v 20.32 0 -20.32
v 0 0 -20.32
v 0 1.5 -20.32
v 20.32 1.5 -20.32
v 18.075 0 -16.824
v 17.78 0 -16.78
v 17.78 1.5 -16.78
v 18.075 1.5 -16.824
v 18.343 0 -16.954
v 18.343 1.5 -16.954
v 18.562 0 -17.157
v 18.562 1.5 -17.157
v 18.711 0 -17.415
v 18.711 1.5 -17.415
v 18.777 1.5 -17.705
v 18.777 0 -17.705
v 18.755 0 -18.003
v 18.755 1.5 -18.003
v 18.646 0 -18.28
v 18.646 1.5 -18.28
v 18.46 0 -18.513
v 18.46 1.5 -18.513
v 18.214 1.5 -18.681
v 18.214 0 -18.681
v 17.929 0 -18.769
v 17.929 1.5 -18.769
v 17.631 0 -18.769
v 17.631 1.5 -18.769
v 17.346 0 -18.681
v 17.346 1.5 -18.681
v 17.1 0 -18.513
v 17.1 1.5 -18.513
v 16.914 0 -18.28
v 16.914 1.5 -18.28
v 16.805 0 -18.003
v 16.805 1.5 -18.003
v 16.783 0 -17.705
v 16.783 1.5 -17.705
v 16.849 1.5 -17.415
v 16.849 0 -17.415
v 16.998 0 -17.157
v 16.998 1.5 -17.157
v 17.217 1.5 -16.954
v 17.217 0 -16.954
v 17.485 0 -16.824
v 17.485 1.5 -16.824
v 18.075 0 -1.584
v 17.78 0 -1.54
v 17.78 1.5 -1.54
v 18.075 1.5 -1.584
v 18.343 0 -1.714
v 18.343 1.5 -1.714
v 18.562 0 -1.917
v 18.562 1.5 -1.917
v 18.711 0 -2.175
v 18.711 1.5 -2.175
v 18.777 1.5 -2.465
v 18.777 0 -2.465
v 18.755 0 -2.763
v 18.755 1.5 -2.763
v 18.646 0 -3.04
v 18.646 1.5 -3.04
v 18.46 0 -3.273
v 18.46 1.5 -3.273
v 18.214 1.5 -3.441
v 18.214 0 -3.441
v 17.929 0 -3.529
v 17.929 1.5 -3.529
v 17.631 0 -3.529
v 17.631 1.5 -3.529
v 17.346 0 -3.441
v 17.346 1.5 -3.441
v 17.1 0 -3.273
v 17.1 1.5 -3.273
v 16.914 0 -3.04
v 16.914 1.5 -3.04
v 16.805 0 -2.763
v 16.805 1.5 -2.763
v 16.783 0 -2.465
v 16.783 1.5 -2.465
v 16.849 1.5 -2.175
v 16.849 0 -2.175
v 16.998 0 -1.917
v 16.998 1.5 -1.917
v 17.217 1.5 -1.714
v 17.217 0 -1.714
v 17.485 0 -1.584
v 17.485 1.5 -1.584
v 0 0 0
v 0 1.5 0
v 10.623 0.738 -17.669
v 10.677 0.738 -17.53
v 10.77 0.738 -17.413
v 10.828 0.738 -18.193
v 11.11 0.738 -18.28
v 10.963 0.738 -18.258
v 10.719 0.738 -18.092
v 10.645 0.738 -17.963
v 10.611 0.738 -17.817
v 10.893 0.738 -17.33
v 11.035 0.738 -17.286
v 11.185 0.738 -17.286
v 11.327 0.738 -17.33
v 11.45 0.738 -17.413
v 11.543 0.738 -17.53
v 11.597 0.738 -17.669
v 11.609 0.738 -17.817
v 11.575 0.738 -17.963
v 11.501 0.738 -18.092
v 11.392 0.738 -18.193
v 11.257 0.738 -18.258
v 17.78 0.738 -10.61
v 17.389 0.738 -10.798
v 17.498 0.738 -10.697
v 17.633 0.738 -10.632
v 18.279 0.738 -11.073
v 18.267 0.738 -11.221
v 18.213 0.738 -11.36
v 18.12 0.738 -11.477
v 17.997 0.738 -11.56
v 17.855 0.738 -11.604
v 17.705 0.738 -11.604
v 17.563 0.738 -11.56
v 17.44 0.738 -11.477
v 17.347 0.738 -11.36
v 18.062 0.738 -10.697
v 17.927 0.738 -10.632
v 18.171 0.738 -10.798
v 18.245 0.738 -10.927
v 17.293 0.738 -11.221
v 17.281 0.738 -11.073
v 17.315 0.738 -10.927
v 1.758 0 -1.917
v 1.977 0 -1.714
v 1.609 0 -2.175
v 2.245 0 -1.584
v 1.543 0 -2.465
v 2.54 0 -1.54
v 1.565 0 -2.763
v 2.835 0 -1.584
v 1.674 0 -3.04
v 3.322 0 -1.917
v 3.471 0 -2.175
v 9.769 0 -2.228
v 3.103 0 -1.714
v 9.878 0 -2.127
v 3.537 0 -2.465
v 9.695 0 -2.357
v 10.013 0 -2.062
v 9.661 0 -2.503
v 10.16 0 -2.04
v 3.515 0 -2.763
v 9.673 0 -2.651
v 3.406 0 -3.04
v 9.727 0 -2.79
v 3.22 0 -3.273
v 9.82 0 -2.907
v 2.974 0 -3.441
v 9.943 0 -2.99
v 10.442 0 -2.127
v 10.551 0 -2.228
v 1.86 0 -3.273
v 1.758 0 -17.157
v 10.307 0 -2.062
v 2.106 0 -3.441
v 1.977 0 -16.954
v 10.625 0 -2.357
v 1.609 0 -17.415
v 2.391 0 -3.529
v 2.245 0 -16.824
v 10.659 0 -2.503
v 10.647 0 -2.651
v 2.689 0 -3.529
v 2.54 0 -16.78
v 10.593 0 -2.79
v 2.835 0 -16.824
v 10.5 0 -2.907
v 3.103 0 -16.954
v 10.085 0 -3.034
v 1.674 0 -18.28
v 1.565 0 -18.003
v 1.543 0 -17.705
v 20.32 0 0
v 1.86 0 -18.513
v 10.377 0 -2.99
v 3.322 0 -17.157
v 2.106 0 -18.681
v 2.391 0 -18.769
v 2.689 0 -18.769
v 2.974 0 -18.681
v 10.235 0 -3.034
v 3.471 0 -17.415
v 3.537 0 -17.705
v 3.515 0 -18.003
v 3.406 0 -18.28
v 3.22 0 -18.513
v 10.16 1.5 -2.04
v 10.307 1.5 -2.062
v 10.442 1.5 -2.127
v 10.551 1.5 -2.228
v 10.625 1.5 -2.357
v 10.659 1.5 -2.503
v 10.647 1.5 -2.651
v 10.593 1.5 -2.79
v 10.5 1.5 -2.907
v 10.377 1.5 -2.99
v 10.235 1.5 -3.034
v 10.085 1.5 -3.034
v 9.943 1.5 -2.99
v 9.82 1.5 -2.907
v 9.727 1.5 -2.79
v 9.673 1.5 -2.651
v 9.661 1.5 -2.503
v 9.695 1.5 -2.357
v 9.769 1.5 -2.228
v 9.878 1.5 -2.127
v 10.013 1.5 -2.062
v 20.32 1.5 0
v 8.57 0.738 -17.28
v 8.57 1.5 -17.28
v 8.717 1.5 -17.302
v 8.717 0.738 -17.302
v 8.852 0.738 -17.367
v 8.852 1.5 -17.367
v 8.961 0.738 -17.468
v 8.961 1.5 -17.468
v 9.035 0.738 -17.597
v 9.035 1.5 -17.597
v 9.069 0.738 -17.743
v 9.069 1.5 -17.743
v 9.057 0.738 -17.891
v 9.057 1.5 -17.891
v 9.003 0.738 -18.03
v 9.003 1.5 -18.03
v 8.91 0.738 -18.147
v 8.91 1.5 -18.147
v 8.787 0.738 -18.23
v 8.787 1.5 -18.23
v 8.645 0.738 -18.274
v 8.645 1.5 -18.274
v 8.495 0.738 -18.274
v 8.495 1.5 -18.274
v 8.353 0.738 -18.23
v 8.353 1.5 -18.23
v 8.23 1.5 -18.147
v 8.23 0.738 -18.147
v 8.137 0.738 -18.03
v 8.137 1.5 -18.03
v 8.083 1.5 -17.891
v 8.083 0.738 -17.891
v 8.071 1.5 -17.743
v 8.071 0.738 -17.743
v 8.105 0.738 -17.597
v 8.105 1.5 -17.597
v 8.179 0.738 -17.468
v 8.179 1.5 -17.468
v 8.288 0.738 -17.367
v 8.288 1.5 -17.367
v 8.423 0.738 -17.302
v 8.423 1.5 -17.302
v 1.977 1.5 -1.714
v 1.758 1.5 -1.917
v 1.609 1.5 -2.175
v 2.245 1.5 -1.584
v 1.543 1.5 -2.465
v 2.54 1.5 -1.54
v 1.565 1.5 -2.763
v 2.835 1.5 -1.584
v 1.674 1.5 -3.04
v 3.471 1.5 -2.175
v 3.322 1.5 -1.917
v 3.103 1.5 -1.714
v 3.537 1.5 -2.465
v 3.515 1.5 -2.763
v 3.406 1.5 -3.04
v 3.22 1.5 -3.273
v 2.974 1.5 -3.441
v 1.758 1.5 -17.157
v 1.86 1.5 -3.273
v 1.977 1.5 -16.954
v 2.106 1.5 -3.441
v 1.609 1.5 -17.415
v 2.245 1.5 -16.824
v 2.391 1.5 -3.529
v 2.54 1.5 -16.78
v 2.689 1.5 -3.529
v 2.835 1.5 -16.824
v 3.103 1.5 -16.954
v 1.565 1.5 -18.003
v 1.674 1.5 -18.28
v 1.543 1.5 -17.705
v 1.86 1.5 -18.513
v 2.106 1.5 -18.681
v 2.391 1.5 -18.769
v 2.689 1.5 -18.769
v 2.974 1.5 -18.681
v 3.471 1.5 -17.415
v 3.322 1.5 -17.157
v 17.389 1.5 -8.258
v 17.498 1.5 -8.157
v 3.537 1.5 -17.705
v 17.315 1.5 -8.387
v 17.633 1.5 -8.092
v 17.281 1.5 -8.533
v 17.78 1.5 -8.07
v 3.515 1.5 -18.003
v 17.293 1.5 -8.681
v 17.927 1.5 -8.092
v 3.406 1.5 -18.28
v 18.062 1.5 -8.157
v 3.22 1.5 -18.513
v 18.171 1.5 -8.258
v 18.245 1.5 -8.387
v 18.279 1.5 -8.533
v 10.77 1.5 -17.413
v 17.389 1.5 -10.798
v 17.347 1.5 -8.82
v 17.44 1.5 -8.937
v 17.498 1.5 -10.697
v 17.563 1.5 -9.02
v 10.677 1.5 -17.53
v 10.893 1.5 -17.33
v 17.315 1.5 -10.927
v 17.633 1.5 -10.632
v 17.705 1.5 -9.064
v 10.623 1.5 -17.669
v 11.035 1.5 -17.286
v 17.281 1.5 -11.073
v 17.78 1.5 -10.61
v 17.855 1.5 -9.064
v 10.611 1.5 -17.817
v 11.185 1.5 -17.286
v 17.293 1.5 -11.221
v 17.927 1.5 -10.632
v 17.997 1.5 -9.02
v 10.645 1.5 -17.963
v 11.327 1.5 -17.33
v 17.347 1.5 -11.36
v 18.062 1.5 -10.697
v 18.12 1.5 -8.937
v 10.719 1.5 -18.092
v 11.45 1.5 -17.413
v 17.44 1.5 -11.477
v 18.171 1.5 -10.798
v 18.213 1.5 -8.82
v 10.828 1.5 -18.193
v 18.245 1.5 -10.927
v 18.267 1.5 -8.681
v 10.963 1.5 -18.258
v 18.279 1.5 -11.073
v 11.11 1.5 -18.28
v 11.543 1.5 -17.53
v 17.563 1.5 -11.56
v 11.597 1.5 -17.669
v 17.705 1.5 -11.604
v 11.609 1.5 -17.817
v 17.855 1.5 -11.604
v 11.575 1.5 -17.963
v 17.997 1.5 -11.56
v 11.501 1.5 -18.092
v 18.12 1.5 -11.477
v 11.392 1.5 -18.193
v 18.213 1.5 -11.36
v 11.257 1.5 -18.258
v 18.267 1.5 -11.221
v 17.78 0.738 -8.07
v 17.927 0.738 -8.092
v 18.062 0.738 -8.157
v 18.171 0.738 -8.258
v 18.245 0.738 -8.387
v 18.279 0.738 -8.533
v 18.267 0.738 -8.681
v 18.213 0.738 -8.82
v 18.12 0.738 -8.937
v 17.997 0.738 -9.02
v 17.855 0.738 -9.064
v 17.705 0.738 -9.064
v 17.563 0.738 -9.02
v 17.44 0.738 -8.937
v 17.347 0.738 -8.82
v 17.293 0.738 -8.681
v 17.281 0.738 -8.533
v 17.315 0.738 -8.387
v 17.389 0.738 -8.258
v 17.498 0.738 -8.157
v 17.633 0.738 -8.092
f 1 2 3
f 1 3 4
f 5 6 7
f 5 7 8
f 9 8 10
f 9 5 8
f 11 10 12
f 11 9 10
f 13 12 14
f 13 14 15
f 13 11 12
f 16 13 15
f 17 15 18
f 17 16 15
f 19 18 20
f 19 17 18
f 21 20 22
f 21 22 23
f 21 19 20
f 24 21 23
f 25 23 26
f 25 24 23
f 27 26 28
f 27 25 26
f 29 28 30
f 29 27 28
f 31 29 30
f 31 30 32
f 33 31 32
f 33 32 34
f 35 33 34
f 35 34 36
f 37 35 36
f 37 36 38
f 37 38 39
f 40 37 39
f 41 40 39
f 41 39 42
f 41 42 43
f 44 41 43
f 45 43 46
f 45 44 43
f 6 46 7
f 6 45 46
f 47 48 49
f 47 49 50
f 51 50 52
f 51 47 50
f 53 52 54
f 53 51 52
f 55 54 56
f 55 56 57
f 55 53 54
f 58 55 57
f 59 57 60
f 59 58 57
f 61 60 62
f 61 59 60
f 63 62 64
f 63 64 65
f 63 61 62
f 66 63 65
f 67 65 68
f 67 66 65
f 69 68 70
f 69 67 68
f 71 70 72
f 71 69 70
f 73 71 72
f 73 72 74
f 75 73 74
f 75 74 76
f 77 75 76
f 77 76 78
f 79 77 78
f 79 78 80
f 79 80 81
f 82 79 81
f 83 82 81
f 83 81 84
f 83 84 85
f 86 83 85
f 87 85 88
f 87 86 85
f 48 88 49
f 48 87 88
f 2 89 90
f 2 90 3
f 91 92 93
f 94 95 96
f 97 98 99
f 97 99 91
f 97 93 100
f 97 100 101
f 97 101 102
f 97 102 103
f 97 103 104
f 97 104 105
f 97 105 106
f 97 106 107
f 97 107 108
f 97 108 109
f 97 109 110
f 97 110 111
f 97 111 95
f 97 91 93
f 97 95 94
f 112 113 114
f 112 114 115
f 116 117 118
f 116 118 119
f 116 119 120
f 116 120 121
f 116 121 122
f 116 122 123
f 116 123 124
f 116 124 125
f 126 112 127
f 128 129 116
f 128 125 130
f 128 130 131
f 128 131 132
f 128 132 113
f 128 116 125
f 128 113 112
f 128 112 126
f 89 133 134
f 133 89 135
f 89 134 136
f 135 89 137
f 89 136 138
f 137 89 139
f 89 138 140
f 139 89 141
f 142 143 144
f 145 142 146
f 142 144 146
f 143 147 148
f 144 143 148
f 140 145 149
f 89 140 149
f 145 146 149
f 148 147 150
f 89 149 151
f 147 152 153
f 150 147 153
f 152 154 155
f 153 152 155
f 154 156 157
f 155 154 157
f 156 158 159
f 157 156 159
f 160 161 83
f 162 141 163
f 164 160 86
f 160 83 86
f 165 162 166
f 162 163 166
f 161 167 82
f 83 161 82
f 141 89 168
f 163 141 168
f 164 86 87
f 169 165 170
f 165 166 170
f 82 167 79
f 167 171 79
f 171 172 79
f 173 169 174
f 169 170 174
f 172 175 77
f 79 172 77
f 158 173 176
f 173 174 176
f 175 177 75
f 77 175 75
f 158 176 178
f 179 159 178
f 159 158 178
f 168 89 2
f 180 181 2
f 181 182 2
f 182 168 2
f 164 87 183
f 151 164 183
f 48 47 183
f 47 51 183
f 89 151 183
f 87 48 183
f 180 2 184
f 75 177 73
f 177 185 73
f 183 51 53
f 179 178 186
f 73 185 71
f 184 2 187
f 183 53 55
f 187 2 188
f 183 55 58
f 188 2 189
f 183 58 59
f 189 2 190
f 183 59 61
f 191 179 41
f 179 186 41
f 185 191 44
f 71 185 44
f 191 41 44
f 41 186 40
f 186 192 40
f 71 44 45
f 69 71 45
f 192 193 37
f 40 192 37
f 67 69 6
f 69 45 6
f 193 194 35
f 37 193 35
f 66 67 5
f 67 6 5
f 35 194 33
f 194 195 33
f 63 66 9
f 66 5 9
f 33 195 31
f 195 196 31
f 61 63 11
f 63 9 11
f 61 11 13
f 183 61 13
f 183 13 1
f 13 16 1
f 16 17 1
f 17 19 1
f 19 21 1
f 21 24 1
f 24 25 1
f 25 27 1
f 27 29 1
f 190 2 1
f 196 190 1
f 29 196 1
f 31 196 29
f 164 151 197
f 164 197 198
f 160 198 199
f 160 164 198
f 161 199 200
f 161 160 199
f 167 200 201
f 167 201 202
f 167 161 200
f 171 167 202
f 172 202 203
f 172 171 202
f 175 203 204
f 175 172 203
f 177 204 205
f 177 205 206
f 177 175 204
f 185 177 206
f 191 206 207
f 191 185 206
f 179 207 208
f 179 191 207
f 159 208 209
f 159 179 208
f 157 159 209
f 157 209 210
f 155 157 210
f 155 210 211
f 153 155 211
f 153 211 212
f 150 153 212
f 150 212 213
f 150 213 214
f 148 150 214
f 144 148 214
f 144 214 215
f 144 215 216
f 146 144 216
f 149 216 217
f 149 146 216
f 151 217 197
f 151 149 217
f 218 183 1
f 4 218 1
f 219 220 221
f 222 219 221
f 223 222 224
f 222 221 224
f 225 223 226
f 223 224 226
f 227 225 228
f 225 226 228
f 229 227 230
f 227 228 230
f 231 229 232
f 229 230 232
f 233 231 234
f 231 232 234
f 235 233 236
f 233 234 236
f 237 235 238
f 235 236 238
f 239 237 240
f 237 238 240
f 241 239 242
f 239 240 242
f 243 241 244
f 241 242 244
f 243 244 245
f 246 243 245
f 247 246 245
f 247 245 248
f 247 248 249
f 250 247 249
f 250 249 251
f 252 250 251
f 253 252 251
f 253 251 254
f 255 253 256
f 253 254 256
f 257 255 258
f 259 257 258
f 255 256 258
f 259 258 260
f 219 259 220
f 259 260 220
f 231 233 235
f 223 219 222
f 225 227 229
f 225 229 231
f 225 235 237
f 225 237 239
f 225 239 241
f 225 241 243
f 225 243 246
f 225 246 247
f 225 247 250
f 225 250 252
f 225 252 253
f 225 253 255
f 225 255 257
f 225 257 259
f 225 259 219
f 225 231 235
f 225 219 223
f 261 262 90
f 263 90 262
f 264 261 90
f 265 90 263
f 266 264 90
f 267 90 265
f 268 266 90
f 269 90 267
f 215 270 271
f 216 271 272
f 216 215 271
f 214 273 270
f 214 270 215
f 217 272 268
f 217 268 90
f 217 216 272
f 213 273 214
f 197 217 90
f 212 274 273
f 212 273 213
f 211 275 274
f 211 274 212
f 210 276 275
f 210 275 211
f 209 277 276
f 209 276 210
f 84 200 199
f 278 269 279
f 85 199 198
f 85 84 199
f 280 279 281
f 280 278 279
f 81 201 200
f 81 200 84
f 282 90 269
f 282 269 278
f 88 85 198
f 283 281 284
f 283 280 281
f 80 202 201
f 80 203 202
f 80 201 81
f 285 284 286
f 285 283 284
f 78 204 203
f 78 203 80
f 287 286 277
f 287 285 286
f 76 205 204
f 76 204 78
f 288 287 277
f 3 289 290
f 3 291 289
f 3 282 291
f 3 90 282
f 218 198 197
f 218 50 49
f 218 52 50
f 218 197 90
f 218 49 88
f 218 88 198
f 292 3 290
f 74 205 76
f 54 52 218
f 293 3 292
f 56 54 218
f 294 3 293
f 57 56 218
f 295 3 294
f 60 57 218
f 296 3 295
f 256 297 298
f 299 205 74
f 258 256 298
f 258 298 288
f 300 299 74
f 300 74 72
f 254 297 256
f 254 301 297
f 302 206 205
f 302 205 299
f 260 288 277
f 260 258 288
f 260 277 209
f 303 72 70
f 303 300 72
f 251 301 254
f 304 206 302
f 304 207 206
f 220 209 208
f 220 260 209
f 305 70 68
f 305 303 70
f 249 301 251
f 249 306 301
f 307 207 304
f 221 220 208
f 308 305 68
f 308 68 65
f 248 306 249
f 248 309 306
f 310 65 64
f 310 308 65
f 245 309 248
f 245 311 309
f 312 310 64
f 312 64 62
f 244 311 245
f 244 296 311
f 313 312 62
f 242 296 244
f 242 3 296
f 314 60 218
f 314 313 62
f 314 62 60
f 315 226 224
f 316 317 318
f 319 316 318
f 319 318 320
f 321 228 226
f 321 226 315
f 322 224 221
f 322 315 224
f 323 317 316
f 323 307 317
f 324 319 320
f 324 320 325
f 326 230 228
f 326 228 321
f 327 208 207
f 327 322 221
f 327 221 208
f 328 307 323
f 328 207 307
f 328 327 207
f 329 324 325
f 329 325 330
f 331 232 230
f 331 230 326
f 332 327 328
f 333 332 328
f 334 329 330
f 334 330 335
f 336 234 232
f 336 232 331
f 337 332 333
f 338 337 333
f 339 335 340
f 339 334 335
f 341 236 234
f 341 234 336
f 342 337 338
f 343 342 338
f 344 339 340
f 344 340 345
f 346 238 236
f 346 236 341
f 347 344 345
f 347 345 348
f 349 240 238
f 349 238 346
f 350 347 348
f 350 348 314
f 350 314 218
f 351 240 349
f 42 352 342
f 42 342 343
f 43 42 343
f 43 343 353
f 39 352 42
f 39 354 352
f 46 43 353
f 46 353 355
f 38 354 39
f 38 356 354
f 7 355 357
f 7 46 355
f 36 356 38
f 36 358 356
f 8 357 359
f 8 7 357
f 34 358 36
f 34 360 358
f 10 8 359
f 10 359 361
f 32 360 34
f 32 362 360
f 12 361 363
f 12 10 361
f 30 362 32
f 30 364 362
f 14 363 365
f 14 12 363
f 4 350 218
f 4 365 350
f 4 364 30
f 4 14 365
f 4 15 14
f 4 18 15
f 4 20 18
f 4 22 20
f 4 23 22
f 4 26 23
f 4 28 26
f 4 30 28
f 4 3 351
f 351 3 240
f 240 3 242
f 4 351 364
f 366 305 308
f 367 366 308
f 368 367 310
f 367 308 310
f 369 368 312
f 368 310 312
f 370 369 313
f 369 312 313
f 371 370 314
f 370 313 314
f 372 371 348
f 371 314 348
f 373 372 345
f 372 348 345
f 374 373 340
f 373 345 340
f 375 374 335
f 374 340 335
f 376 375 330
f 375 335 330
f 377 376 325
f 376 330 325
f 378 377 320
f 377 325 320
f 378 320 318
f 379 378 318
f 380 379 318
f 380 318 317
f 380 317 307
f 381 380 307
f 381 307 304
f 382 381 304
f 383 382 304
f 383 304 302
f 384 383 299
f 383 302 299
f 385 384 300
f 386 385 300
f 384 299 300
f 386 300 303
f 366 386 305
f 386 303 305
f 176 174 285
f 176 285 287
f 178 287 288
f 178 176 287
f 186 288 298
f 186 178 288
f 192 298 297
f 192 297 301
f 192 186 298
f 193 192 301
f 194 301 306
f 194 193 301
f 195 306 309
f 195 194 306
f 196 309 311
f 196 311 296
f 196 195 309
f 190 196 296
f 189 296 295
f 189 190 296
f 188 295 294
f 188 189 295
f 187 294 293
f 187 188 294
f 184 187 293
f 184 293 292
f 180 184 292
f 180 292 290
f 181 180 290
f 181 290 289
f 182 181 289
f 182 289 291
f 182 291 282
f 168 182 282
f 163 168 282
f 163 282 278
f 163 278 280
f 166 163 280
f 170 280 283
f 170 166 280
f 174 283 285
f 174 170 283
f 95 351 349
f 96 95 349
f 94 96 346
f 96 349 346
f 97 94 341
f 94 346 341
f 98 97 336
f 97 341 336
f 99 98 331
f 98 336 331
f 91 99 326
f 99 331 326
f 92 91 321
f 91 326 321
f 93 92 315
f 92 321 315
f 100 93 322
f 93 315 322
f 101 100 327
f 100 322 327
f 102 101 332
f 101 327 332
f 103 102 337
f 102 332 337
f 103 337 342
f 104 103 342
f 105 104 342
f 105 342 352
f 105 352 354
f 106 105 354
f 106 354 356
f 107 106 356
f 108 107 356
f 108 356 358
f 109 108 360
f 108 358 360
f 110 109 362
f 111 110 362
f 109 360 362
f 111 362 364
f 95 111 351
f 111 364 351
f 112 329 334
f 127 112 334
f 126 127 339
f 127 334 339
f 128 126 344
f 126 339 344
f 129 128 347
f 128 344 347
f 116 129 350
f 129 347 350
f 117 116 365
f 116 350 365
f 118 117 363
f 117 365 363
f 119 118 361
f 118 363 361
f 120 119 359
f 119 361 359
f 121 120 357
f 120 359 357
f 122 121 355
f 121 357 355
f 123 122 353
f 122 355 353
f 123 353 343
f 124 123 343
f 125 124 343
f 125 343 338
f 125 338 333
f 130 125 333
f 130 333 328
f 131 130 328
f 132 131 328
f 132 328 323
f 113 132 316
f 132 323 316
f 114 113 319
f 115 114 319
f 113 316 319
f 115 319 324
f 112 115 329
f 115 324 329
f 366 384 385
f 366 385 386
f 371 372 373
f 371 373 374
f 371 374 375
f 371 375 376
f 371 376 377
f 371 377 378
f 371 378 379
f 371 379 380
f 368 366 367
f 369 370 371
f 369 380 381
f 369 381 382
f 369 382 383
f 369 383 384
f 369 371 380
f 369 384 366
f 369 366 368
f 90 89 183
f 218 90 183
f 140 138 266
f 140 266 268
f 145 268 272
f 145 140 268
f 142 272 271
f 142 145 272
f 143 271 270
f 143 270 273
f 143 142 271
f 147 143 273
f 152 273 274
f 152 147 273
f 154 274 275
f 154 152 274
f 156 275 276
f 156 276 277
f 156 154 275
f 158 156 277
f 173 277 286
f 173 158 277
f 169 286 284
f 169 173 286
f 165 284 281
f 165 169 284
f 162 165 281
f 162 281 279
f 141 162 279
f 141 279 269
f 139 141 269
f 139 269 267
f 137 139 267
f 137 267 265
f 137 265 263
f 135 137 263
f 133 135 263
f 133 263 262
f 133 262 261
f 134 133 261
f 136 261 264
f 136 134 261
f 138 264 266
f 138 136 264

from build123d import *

# Parameters (mm, degrees)
SKETCH1_W           = 20.32
SKETCH1_H           = 20.32
SKETCH1_R           = 1
SKETCH1_R_2         = 0.5
BOSS_EXTRUDE1_DEPTH = 1.5
CUT_EXTRUDE1_START  = 1.5
SKETCH1_3_R         = 0.5
CUT_EXTRUDE1_DEPTH  = 0.762


with BuildPart() as part:
    # Sketch1 → Boss-Extrude1 (new body)
    with BuildSketch(Plane(origin=(0, 0, 0), x_dir=(1, 0, 0), z_dir=(0, 1, 0))):
        with Locations((10.16, 10.16)):
            Rectangle(SKETCH1_W, SKETCH1_H)
        with Locations(Location((2.54, 2.54, 0), (0, 0, 270))):  # turned: the seam where the file's is
            Circle(SKETCH1_R, mode=Mode.SUBTRACT)
        with Locations(Location((17.78, 2.54, 0), (0, 0, 270))):  # turned: the seam where the file's is
            Circle(SKETCH1_R, mode=Mode.SUBTRACT)
        with Locations(Location((17.78, 17.78, 0), (0, 0, 270))):  # turned: the seam where the file's is
            Circle(SKETCH1_R, mode=Mode.SUBTRACT)
        with Locations(Location((2.54, 17.78, 0), (0, 0, 270))):  # turned: the seam where the file's is
            Circle(SKETCH1_R, mode=Mode.SUBTRACT)
        with Locations(Location((10.16, 2.54, 0), (0, 0, 270))):  # turned: the seam where the file's is
            Circle(SKETCH1_R_2, mode=Mode.SUBTRACT)
    extrude(amount=BOSS_EXTRUDE1_DEPTH)

    # Sketch1_3 → Cut-Extrude1 (cut)
    with BuildSketch(Plane(origin=(0, 0, 0), x_dir=(1, 0, 0), z_dir=(0, 1, 0)).offset(CUT_EXTRUDE1_START)):
        with Locations(Location((17.78, 11.11, 0), (0, 0, 270))):  # turned: the seam where the file's is
            Circle(SKETCH1_3_R)
        with Locations(Location((17.78, 8.57, 0), (0, 0, 270))):  # turned: the seam where the file's is
            Circle(SKETCH1_3_R)
        with Locations(Location((11.109999878, 17.78, 0), (0, 0, 90))):  # turned: the seam where the file's is
            Circle(SKETCH1_3_R)
        with Locations(Location((8.569999878, 17.78, 0), (0, 0, 270))):  # turned: the seam where the file's is
            Circle(SKETCH1_3_R)
    extrude(amount=-CUT_EXTRUDE1_DEPTH, mode=Mode.SUBTRACT)


solid = part.part
